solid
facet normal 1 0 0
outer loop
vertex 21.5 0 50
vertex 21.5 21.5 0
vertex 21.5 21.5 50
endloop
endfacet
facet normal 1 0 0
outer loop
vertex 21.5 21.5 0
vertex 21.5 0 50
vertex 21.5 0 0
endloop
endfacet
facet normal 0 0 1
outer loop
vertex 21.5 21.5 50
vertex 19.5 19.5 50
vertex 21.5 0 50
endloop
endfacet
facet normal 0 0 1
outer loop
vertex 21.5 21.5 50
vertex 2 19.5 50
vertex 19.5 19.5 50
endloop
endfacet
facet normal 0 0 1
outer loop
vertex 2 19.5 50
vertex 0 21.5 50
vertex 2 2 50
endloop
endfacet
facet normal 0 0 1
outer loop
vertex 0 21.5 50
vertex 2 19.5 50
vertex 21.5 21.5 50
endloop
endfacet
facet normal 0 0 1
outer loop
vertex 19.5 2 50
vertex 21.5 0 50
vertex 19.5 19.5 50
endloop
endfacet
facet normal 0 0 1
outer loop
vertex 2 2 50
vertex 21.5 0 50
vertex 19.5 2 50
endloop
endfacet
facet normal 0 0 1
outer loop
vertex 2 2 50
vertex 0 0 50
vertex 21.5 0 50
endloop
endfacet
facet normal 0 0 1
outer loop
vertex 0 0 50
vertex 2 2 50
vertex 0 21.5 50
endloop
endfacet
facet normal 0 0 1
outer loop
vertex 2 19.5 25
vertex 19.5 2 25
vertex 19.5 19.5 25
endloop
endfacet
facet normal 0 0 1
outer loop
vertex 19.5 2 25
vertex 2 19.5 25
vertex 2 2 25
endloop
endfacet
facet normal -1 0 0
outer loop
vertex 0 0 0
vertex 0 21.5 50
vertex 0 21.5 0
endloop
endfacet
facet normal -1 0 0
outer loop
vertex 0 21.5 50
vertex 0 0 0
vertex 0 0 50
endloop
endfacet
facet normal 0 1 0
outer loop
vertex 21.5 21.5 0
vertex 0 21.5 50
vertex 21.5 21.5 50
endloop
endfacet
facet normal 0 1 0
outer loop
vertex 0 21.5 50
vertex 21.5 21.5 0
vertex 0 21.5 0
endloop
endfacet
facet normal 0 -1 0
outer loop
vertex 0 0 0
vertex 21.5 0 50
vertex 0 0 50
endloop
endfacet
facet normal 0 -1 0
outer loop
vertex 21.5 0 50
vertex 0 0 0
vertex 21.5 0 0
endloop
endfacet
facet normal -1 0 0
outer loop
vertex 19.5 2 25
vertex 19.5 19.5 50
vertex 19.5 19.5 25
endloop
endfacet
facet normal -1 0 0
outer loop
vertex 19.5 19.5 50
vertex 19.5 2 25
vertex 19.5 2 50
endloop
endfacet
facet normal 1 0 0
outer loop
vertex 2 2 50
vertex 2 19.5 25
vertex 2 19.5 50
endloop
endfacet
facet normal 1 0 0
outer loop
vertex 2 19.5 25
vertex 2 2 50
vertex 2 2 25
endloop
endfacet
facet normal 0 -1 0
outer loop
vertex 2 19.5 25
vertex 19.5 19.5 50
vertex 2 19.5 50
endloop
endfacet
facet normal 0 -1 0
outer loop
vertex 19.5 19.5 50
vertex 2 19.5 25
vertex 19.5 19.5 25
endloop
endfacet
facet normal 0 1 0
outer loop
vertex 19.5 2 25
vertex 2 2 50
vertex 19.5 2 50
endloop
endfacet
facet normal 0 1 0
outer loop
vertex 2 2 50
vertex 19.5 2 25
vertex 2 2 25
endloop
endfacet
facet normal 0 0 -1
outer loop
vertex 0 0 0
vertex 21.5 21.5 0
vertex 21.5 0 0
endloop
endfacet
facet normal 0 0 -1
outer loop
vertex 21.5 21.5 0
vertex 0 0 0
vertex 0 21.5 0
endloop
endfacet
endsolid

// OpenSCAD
width = 17.5;
depth = 17.5;
height = 25;
thickness = 2;
foot_height = 25;

translate([0, 0, foot_height])difference(){
    cube([width + thickness * 2, depth  + thickness *2, height]);
    translate([thickness,thickness,0]) cube([width, depth, height]);
 }
 cube([width + thickness * 2, depth  + thickness *2, foot_height]);
